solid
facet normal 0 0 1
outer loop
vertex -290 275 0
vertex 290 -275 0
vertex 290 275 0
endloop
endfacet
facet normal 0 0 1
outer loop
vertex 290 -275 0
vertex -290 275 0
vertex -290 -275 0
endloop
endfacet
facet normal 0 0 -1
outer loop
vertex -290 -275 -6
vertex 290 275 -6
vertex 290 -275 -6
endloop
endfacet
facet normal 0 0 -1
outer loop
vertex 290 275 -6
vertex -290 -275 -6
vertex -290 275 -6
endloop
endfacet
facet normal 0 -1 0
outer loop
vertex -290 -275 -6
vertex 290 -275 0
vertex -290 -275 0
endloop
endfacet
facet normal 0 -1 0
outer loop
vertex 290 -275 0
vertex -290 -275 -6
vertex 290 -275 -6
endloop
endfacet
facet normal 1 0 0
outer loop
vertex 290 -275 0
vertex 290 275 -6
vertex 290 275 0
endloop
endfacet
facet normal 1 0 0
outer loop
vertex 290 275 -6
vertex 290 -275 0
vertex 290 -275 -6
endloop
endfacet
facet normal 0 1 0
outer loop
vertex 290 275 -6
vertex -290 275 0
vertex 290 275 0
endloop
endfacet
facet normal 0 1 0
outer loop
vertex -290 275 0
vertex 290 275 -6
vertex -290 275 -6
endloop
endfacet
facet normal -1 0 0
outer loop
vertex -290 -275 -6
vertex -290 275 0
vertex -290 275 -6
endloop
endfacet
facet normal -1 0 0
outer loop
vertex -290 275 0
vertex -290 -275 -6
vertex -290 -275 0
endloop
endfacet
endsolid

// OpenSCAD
// v3 assembly video: individual parts (machine coordinates) for steps 1-5 and 9:
// backing board, tiles, keys, tee-nuts, feet, electronics tray + boards, riser,
// rails, bearings, conveyor, sorting tray, and their fasteners.
// Export one part:  openscad --backend=manifold -D 'part="v3_tile3"' -o tile3.stl w_base.scad
// (the "v3_" prefix keeps the used part files' own `part` selectors inert).
use <../assembly.scad>
use <../machine_frame.scad>
use <../baseplate_tile.scad>
use <../riser.scad>
use <../conveyor_rail.scad>
use <../conveyor_roller.scad>
use <../motor_mount.scad>
use <../slide_bed.scad>
use <../sorting_tray.scad>
use <../electronics_tray.scad>
include <hw_common.scad>

part = "v3_board";
P = part;
base_top = 4;
board_t = 6;
deck_z = 64;
belt_x0 = -165;
rail_in = 45;
roller_x = [-140, 60];
shaft_z = 79;

// ── Step 1: board, tiles, keys, tee-nuts, feet ──────────────────────────────
module board() translate([-290, -275, -board_t]) cube([580, 550, board_t]);
module tile(i) translate([floor(i / 3) * 190 - 285, (i % 3) * 180 - 270, 0]) baseplate_tile();
key_z = base_top - 0.1 - 2.3;
module keys() {
    for (x = [-95, 95], r = [0 : 2], ky = [30, 150])          // seams at X = const (key spans X)
        translate([x, -270 + 180 * r + ky, key_z]) baseplate_key();
    for (y = [-90, 90], c = [0 : 2], kx = [30, 150])          // seams at Y = const
        translate([-285 + 190 * c + kx, y, key_z]) rotate(90) baseplate_key();
}
// the 49 board holes (ASSEMBLY.md §4 table)
holes = [[-120, 105], [-50, 105], [-120, 195], [10, 195],                         // electronics tray
         [-150, -105], [-150, 75], [-80, -15], [-20, 75], [-20, 45],             // riser anchors
         [-80, -75], [-120, 75], [-80, 75], [10, 75],                            // rail through-feet
         [-240, -15], [-240, 15], [-180, -15], [-180, 15],                       // hopper
         [-180, -165], [-120, -165], [-180, -135], [-120, -135],                 // arm tower
         for (x = [200, 260], y = [-105, -45, 45, 105]) [x, y],                  // sorting tray
         [110, -225], [140, -195], [140, -165], [110, 225], [110, 255], [140, 255],   // end posts
         for (y = [-105, -45, 45, 105]) [140, y],                                // lower ramp
         for (x = [200, 230], y = [165, 195]) [x, y],                            // reject bin
         for (x = [-270, -240], y = [-225, -195]) [x, y],                        // pump bracket
         [-180, -255], [-150, -255]];                                            // vent-valve clip
echo(str("V3 board holes: ", len(holes)));
module hole_marks() for (h = holes) translate([h[0], h[1], base_top]) cylinder(d = 7, h = 0.4, $fn = 24);
module teenuts() for (h = holes) teenut(h, -board_t);
feet_xy = [for (x = [-268, 268], y = [-255, 0, 255]) [x, y], [0, -255], [0, 255]];
module feet() for (f = feet_xy) translate([f[0], f[1], -board_t - 10]) cylinder(d = 20, h = 10, $fn = 32);

// ── Step 2: electronics tray + boards ───────────────────────────────────────
tray_o = [-150, 80, base_top + 2.5];     // floor top
post_h = 5; pol_h = 4; foam = 1;
b_pi  = [[107, 5],    [65, 30],       post_h];
b_pca = [[108, 44],   [62.23, 25.4],  post_h];
b_rly = [[5, 42],     [50, 38.5],     post_h];
b_uln = [[62, 42],    [35, 32],       post_h];
b_hx  = [[62.3, 82.3],[34, 21],       foam];
b_l91 = [[38.3, 5.3], [29, 23],       foam];
b_d22 = [[40, 125],   [17.8, 17.8],   pol_h];
b_d50 = [[62, 125],   [17.8, 20.3],   pol_h];
b_d36 = [[104, 125],  [17.8, 20.3],   pol_h];
function at(b, x, y) = tray_o + [b[0][0] + x, b[0][1] + y, b[2] + 1.6];
module pcb(b) translate(tray_o + [b[0][0], b[0][1], b[2]]) cube([b[1][0], b[1][1], 1.6]);
module bscrews(b, hs, d = 2.5) for (h = hs) translate(at(b, h[0], h[1])) cylinder(d = d * 1.8, h = 1.6, $fn = 14);
pi_h  = [[3.5, 3.5], [61.5, 3.5], [3.5, 26.5], [61.5, 26.5]];
pca_h = [for (x = [3.175, 59.055], y = [3.175, 22.225]) [x, y]];
rly_h = [for (x = [-1, 1], y = [-1, 1]) [25 + x * 22.15, 19.25 + y * 16.4]];
uln_h = [for (x = [-1, 1], y = [-1, 1]) [17.5 + x * 15, 16 + y * 13.25]];
module pi_chips()  { translate(at(b_pi, 28, 9)) cube([12, 12, 1.2]); translate(at(b_pi, 61, 9.5)) cube([4.5, 11, 3]);
                     translate(at(b_pi, 8, 24)) cube([51, 5, 8.5]); }                       // SoC, CSI (+X), GPIO header
module pca_chips() { translate(at(b_pca, 26, 8)) cube([10, 10, 1.4]); translate(at(b_pca, 4, 2)) cube([2.5, 21, 8.5]);
                     for (i = [0 : 3]) translate(at(b_pca, 14 + i * 9, 18)) cube([8, 6, 8]); }  // servo header blocks
module rly_chips() { for (y = [3, 20.5]) translate(at(b_rly, 18, y)) cube([19, 15.5, 15.5]);
                     for (y = [5, 22]) translate(at(b_rly, 40, y)) cube([8, 11, 9]); }   // relays + terminals
module uln_chips() { translate(at(b_uln, 7, 9)) cube([20, 7, 3]); translate(at(b_uln, 4, 24)) cube([12, 6, 6]); }
module hx_chips()  { translate(at(b_hx, 12, 7)) cube([7, 5, 1.4]); translate(at(b_l91, 8, 8)) cube([5, 4, 1.4]);
                     translate(at(b_l91, 1, 14)) cube([7, 8, 8]); }
module pol_chips() for (b = [b_d22, b_d50, b_d36]) translate(at(b, 5, 5)) cube([7, 7, 3]);
module foam_tape() for (b = [b_hx, b_l91]) translate(tray_o + [b[0][0] + 2, b[0][1] + 2, 0]) cube([b[1][0] - 4, b[1][1] - 4, 1]);
// tray → board: 4 × M3 × 18 SHCS, head on the floor top
module tray_screws() for (h = [[-120, 105], [-50, 105], [-120, 195], [10, 195]]) at_screw([h[0], h[1], base_top + 2.5]) shcs(18);
// panel barrel jack in the +Y wall (tray-local x 92, 18 up): body inside, nut outside
module jack() translate([-150 + 92, 80 + 150, base_top + 18]) rotate([90, 0, 0]) {
    translate([0, 0, -3]) cylinder(d = 8, h = 3 + 2.5 + 2, $fn = 24);          // M8 thread through the wall
    translate([0, 0, -2.5]) cylinder(d = 12, h = 2.5, $fn = 6);                 // nut outside
    translate([0, 0, 2.5]) cylinder(d = 11, h = 14, $fn = 24);                  // body inside
}
// Wago 221 bank (5 levers) + 3 × 1000 µF on the free floor
module wago() for (i = [0 : 4]) translate(tray_o + [128 + i * 10.5, 128, 0]) cube([8.5, 18.5, 8]);
module wago_levers() for (i = [0 : 4]) for (j = [0 : 2]) translate(tray_o + [129 + i * 10.5, 129.5 + j * 5.8, 8]) cube([6.5, 4, 3]);
module caps() for (p = [[16, 96], [32, 96], [118, 92]]) translate(tray_o + [p[0], p[1], 0]) cylinder(d = 10, h = 16, $fn = 24);

// ── Step 3: riser ───────────────────────────────────────────────────────────
module riser_joint_screws() for (p = [[-30, 40], [30, 30], [65, 30]]) at_screw([-43, p[0], p[1]], [1, 0, 0]) shcs(12);
module riser_joint_nuts() for (p = [[-30, 40], [30, 30], [65, 30]]) translate([-37.4, p[0], p[1]]) rotate([0, 90, 0]) hexnut();
module riser_tie_screws() for (z = [37, 56]) at_screw([-30.5, -113, z], [0, 1, 0]) csk(10);
module riser_anchors() for (h = [[-150, -105], [-150, 75], [-80, -15], [-20, 75], [-20, 45]]) at_screw([h[0], h[1], 10]) shcs(20);

// ── Step 4: rails + bearings ────────────────────────────────────────────────
module rail_piece(side, k)
    translate([belt_x0, side * rail_in, deck_z]) mirror([0, side < 0 ? 1 : 0, 0])
        if (k == 0) rail_half(add_shaft_far = false, motor_mount = (side < 0));
        else translate([125, 0, 0]) rail_half(add_shaft_far = true, motor_mount = (side < 0));
module bearings(side) for (x = roller_x) translate([x, side * (rail_in + 3), shaft_z]) rotate([side > 0 ? -90 : 90, 0, 0])
    difference() { cylinder(d = 22, h = 7, $fn = 48); translate([0, 0, -0.1]) cylinder(d = 8, h = 7.2, $fn = 32); }
module collars(side) for (x = roller_x) translate([x, side * (rail_in + rail_boss_face_y()), deck_z])
    mirror([0, side < 0 ? 1 : 0, 0]) motor_mount_collar();
module rail_through() for (h = [[-80, -75], [-120, 75], [-80, 75], [10, 75]]) at_screw([h[0], h[1], deck_z + 4]) shcs(80);
module rail_insert_screws() for (h = [[-50, -75], [40, 75]]) at_screw([h[0], h[1], deck_z + 4]) shcs(10);

// ── Step 5: conveyor ────────────────────────────────────────────────────────
module mm_at(x) translate([x, -rail_in, deck_z]) mirror([0, 1, 0]) translate([0, rail_boss_face_y(), 0]) children();
module mm_screws() for (x = roller_x, dx = [-15, 15]) at_screw([x + dx, -(rail_in + rail_boss_face_y() + 4), deck_z + 24], [0, 1, 0]) bhcs(10);

// ── Step 9: sorting tray (tray-local → machine: X = 276 − y, Y = −137 + x) ──
sec_w = 137; floor_h = 65; shelf_h = 3;
module tray_T() translate([276, -137, base_top]) rotate(90) children();
module tray_lower_screws() for (x = [200, 260], y = [-105, -45, 45, 105]) at_screw([x, y, base_top + 2.5]) csk(18);
module tray_stack_screws() tray_T() for (s = [0, 1], i = [0, 1], cx = [2.5 + i * 67 + 3.5, 2.5 + i * 67 + 65 - 3.5])
    at_screw([s * sec_w + cx, 5.6, floor_h + shelf_h + 2.5]) csk(12);

// ── selector ────────────────────────────────────────────────────────────────
if (P == "v3_board") board();
for (i = [0 : 8]) if (P == str("v3_tile", i)) tile(i);
if (P == "v3_keys") keys();
if (P == "v3_holemarks") hole_marks();
if (P == "v3_teenuts") teenuts();
if (P == "v3_feet") feet();
if (P == "v3_etray") asm_electronics_tray();
if (P == "v3_etray_screws") tray_screws();
if (P == "v3_jack") jack();
if (P == "v3_pi") pcb(b_pi);
if (P == "v3_pi_chips") pi_chips();
if (P == "v3_pi_scr") bscrews(b_pi, pi_h);
if (P == "v3_pca") pcb(b_pca);
if (P == "v3_pca_chips") pca_chips();
if (P == "v3_pca_scr") bscrews(b_pca, pca_h);
if (P == "v3_rly") pcb(b_rly);
if (P == "v3_rly_chips") rly_chips();
if (P == "v3_rly_scr") bscrews(b_rly, rly_h);
if (P == "v3_uln") pcb(b_uln);
if (P == "v3_uln_chips") uln_chips();
if (P == "v3_uln_scr") bscrews(b_uln, uln_h);
if (P == "v3_hxl9") { pcb(b_hx); pcb(b_l91); }
if (P == "v3_hxl9_chips") hx_chips();
if (P == "v3_foam") foam_tape();
if (P == "v3_pol") { pcb(b_d22); pcb(b_d50); pcb(b_d36); }
if (P == "v3_pol_chips") pol_chips();
if (P == "v3_pol_scr") { bscrews(b_d22, [[2.3, 15.5], [15.5, 2.3]], 2); bscrews(b_d50, [[2.2, 2.2], [15.7, 18.2]], 2); bscrews(b_d36, [[2.2, 2.2], [15.7, 18.2]], 2); }
if (P == "v3_wago") wago();
if (P == "v3_wago_lev") wago_levers();
if (P == "v3_caps") caps();
if (P == "v3_riser_a") riser_a();
if (P == "v3_riser_b") riser_b();
if (P == "v3_riser_joint") { riser_joint_screws(); riser_joint_nuts(); }
if (P == "v3_riser_tie") riser_tie_screws();
if (P == "v3_riser_anchors") riser_anchors();
if (P == "v3_rail_back1") rail_piece(1, 0);
if (P == "v3_rail_back2") rail_piece(1, 1);
if (P == "v3_rail_front1") rail_piece(-1, 0);
if (P == "v3_rail_front2") rail_piece(-1, 1);
if (P == "v3_bearings_f") bearings(-1);
if (P == "v3_bearings_b") bearings(1);
if (P == "v3_rail_through") rail_through();
if (P == "v3_rail_inserts") rail_insert_screws();
for (k = [0, 1]) {
    if (P == str("v3_mm", k)) mm_at(roller_x[k]) motor_mount();
    if (P == str("v3_n20_", k)) mm_at(roller_x[k]) motor_mount_n20();
    if (P == str("v3_cpl", k)) mm_at(roller_x[k]) motor_mount_coupling();
}
if (P == "v3_slidebed") asm_slide_bed();
if (P == "v3_belts") asm_belts();
if (P == "v3_rollers") asm_rollers();
if (P == "v3_rods") asm_rods();
if (P == "v3_collars_f") collars(-1);
if (P == "v3_collars_b") collars(1);
if (P == "v3_mm_screws") mm_screws();
if (P == "v3_tray_a") tray_T() tray_floor_section(0, true, false);
if (P == "v3_tray_b") tray_T() translate([sec_w, 0, 0]) tray_floor_section(2, false, true);
if (P == "v3_tray_lscr") tray_lower_screws();
if (P == "v3_shelf") tray_T() translate([0, 0, floor_h]) { floor_shelf_half(0); floor_shelf_half(1); }
if (P == "v3_tray_c") tray_T() translate([0, 0, floor_h + shelf_h]) tray_floor_section(4, true, false);
if (P == "v3_tray_d") tray_T() translate([sec_w, 0, floor_h + shelf_h]) tray_floor_section(6, false, true);
if (P == "v3_tray_sscr") tray_stack_screws();
